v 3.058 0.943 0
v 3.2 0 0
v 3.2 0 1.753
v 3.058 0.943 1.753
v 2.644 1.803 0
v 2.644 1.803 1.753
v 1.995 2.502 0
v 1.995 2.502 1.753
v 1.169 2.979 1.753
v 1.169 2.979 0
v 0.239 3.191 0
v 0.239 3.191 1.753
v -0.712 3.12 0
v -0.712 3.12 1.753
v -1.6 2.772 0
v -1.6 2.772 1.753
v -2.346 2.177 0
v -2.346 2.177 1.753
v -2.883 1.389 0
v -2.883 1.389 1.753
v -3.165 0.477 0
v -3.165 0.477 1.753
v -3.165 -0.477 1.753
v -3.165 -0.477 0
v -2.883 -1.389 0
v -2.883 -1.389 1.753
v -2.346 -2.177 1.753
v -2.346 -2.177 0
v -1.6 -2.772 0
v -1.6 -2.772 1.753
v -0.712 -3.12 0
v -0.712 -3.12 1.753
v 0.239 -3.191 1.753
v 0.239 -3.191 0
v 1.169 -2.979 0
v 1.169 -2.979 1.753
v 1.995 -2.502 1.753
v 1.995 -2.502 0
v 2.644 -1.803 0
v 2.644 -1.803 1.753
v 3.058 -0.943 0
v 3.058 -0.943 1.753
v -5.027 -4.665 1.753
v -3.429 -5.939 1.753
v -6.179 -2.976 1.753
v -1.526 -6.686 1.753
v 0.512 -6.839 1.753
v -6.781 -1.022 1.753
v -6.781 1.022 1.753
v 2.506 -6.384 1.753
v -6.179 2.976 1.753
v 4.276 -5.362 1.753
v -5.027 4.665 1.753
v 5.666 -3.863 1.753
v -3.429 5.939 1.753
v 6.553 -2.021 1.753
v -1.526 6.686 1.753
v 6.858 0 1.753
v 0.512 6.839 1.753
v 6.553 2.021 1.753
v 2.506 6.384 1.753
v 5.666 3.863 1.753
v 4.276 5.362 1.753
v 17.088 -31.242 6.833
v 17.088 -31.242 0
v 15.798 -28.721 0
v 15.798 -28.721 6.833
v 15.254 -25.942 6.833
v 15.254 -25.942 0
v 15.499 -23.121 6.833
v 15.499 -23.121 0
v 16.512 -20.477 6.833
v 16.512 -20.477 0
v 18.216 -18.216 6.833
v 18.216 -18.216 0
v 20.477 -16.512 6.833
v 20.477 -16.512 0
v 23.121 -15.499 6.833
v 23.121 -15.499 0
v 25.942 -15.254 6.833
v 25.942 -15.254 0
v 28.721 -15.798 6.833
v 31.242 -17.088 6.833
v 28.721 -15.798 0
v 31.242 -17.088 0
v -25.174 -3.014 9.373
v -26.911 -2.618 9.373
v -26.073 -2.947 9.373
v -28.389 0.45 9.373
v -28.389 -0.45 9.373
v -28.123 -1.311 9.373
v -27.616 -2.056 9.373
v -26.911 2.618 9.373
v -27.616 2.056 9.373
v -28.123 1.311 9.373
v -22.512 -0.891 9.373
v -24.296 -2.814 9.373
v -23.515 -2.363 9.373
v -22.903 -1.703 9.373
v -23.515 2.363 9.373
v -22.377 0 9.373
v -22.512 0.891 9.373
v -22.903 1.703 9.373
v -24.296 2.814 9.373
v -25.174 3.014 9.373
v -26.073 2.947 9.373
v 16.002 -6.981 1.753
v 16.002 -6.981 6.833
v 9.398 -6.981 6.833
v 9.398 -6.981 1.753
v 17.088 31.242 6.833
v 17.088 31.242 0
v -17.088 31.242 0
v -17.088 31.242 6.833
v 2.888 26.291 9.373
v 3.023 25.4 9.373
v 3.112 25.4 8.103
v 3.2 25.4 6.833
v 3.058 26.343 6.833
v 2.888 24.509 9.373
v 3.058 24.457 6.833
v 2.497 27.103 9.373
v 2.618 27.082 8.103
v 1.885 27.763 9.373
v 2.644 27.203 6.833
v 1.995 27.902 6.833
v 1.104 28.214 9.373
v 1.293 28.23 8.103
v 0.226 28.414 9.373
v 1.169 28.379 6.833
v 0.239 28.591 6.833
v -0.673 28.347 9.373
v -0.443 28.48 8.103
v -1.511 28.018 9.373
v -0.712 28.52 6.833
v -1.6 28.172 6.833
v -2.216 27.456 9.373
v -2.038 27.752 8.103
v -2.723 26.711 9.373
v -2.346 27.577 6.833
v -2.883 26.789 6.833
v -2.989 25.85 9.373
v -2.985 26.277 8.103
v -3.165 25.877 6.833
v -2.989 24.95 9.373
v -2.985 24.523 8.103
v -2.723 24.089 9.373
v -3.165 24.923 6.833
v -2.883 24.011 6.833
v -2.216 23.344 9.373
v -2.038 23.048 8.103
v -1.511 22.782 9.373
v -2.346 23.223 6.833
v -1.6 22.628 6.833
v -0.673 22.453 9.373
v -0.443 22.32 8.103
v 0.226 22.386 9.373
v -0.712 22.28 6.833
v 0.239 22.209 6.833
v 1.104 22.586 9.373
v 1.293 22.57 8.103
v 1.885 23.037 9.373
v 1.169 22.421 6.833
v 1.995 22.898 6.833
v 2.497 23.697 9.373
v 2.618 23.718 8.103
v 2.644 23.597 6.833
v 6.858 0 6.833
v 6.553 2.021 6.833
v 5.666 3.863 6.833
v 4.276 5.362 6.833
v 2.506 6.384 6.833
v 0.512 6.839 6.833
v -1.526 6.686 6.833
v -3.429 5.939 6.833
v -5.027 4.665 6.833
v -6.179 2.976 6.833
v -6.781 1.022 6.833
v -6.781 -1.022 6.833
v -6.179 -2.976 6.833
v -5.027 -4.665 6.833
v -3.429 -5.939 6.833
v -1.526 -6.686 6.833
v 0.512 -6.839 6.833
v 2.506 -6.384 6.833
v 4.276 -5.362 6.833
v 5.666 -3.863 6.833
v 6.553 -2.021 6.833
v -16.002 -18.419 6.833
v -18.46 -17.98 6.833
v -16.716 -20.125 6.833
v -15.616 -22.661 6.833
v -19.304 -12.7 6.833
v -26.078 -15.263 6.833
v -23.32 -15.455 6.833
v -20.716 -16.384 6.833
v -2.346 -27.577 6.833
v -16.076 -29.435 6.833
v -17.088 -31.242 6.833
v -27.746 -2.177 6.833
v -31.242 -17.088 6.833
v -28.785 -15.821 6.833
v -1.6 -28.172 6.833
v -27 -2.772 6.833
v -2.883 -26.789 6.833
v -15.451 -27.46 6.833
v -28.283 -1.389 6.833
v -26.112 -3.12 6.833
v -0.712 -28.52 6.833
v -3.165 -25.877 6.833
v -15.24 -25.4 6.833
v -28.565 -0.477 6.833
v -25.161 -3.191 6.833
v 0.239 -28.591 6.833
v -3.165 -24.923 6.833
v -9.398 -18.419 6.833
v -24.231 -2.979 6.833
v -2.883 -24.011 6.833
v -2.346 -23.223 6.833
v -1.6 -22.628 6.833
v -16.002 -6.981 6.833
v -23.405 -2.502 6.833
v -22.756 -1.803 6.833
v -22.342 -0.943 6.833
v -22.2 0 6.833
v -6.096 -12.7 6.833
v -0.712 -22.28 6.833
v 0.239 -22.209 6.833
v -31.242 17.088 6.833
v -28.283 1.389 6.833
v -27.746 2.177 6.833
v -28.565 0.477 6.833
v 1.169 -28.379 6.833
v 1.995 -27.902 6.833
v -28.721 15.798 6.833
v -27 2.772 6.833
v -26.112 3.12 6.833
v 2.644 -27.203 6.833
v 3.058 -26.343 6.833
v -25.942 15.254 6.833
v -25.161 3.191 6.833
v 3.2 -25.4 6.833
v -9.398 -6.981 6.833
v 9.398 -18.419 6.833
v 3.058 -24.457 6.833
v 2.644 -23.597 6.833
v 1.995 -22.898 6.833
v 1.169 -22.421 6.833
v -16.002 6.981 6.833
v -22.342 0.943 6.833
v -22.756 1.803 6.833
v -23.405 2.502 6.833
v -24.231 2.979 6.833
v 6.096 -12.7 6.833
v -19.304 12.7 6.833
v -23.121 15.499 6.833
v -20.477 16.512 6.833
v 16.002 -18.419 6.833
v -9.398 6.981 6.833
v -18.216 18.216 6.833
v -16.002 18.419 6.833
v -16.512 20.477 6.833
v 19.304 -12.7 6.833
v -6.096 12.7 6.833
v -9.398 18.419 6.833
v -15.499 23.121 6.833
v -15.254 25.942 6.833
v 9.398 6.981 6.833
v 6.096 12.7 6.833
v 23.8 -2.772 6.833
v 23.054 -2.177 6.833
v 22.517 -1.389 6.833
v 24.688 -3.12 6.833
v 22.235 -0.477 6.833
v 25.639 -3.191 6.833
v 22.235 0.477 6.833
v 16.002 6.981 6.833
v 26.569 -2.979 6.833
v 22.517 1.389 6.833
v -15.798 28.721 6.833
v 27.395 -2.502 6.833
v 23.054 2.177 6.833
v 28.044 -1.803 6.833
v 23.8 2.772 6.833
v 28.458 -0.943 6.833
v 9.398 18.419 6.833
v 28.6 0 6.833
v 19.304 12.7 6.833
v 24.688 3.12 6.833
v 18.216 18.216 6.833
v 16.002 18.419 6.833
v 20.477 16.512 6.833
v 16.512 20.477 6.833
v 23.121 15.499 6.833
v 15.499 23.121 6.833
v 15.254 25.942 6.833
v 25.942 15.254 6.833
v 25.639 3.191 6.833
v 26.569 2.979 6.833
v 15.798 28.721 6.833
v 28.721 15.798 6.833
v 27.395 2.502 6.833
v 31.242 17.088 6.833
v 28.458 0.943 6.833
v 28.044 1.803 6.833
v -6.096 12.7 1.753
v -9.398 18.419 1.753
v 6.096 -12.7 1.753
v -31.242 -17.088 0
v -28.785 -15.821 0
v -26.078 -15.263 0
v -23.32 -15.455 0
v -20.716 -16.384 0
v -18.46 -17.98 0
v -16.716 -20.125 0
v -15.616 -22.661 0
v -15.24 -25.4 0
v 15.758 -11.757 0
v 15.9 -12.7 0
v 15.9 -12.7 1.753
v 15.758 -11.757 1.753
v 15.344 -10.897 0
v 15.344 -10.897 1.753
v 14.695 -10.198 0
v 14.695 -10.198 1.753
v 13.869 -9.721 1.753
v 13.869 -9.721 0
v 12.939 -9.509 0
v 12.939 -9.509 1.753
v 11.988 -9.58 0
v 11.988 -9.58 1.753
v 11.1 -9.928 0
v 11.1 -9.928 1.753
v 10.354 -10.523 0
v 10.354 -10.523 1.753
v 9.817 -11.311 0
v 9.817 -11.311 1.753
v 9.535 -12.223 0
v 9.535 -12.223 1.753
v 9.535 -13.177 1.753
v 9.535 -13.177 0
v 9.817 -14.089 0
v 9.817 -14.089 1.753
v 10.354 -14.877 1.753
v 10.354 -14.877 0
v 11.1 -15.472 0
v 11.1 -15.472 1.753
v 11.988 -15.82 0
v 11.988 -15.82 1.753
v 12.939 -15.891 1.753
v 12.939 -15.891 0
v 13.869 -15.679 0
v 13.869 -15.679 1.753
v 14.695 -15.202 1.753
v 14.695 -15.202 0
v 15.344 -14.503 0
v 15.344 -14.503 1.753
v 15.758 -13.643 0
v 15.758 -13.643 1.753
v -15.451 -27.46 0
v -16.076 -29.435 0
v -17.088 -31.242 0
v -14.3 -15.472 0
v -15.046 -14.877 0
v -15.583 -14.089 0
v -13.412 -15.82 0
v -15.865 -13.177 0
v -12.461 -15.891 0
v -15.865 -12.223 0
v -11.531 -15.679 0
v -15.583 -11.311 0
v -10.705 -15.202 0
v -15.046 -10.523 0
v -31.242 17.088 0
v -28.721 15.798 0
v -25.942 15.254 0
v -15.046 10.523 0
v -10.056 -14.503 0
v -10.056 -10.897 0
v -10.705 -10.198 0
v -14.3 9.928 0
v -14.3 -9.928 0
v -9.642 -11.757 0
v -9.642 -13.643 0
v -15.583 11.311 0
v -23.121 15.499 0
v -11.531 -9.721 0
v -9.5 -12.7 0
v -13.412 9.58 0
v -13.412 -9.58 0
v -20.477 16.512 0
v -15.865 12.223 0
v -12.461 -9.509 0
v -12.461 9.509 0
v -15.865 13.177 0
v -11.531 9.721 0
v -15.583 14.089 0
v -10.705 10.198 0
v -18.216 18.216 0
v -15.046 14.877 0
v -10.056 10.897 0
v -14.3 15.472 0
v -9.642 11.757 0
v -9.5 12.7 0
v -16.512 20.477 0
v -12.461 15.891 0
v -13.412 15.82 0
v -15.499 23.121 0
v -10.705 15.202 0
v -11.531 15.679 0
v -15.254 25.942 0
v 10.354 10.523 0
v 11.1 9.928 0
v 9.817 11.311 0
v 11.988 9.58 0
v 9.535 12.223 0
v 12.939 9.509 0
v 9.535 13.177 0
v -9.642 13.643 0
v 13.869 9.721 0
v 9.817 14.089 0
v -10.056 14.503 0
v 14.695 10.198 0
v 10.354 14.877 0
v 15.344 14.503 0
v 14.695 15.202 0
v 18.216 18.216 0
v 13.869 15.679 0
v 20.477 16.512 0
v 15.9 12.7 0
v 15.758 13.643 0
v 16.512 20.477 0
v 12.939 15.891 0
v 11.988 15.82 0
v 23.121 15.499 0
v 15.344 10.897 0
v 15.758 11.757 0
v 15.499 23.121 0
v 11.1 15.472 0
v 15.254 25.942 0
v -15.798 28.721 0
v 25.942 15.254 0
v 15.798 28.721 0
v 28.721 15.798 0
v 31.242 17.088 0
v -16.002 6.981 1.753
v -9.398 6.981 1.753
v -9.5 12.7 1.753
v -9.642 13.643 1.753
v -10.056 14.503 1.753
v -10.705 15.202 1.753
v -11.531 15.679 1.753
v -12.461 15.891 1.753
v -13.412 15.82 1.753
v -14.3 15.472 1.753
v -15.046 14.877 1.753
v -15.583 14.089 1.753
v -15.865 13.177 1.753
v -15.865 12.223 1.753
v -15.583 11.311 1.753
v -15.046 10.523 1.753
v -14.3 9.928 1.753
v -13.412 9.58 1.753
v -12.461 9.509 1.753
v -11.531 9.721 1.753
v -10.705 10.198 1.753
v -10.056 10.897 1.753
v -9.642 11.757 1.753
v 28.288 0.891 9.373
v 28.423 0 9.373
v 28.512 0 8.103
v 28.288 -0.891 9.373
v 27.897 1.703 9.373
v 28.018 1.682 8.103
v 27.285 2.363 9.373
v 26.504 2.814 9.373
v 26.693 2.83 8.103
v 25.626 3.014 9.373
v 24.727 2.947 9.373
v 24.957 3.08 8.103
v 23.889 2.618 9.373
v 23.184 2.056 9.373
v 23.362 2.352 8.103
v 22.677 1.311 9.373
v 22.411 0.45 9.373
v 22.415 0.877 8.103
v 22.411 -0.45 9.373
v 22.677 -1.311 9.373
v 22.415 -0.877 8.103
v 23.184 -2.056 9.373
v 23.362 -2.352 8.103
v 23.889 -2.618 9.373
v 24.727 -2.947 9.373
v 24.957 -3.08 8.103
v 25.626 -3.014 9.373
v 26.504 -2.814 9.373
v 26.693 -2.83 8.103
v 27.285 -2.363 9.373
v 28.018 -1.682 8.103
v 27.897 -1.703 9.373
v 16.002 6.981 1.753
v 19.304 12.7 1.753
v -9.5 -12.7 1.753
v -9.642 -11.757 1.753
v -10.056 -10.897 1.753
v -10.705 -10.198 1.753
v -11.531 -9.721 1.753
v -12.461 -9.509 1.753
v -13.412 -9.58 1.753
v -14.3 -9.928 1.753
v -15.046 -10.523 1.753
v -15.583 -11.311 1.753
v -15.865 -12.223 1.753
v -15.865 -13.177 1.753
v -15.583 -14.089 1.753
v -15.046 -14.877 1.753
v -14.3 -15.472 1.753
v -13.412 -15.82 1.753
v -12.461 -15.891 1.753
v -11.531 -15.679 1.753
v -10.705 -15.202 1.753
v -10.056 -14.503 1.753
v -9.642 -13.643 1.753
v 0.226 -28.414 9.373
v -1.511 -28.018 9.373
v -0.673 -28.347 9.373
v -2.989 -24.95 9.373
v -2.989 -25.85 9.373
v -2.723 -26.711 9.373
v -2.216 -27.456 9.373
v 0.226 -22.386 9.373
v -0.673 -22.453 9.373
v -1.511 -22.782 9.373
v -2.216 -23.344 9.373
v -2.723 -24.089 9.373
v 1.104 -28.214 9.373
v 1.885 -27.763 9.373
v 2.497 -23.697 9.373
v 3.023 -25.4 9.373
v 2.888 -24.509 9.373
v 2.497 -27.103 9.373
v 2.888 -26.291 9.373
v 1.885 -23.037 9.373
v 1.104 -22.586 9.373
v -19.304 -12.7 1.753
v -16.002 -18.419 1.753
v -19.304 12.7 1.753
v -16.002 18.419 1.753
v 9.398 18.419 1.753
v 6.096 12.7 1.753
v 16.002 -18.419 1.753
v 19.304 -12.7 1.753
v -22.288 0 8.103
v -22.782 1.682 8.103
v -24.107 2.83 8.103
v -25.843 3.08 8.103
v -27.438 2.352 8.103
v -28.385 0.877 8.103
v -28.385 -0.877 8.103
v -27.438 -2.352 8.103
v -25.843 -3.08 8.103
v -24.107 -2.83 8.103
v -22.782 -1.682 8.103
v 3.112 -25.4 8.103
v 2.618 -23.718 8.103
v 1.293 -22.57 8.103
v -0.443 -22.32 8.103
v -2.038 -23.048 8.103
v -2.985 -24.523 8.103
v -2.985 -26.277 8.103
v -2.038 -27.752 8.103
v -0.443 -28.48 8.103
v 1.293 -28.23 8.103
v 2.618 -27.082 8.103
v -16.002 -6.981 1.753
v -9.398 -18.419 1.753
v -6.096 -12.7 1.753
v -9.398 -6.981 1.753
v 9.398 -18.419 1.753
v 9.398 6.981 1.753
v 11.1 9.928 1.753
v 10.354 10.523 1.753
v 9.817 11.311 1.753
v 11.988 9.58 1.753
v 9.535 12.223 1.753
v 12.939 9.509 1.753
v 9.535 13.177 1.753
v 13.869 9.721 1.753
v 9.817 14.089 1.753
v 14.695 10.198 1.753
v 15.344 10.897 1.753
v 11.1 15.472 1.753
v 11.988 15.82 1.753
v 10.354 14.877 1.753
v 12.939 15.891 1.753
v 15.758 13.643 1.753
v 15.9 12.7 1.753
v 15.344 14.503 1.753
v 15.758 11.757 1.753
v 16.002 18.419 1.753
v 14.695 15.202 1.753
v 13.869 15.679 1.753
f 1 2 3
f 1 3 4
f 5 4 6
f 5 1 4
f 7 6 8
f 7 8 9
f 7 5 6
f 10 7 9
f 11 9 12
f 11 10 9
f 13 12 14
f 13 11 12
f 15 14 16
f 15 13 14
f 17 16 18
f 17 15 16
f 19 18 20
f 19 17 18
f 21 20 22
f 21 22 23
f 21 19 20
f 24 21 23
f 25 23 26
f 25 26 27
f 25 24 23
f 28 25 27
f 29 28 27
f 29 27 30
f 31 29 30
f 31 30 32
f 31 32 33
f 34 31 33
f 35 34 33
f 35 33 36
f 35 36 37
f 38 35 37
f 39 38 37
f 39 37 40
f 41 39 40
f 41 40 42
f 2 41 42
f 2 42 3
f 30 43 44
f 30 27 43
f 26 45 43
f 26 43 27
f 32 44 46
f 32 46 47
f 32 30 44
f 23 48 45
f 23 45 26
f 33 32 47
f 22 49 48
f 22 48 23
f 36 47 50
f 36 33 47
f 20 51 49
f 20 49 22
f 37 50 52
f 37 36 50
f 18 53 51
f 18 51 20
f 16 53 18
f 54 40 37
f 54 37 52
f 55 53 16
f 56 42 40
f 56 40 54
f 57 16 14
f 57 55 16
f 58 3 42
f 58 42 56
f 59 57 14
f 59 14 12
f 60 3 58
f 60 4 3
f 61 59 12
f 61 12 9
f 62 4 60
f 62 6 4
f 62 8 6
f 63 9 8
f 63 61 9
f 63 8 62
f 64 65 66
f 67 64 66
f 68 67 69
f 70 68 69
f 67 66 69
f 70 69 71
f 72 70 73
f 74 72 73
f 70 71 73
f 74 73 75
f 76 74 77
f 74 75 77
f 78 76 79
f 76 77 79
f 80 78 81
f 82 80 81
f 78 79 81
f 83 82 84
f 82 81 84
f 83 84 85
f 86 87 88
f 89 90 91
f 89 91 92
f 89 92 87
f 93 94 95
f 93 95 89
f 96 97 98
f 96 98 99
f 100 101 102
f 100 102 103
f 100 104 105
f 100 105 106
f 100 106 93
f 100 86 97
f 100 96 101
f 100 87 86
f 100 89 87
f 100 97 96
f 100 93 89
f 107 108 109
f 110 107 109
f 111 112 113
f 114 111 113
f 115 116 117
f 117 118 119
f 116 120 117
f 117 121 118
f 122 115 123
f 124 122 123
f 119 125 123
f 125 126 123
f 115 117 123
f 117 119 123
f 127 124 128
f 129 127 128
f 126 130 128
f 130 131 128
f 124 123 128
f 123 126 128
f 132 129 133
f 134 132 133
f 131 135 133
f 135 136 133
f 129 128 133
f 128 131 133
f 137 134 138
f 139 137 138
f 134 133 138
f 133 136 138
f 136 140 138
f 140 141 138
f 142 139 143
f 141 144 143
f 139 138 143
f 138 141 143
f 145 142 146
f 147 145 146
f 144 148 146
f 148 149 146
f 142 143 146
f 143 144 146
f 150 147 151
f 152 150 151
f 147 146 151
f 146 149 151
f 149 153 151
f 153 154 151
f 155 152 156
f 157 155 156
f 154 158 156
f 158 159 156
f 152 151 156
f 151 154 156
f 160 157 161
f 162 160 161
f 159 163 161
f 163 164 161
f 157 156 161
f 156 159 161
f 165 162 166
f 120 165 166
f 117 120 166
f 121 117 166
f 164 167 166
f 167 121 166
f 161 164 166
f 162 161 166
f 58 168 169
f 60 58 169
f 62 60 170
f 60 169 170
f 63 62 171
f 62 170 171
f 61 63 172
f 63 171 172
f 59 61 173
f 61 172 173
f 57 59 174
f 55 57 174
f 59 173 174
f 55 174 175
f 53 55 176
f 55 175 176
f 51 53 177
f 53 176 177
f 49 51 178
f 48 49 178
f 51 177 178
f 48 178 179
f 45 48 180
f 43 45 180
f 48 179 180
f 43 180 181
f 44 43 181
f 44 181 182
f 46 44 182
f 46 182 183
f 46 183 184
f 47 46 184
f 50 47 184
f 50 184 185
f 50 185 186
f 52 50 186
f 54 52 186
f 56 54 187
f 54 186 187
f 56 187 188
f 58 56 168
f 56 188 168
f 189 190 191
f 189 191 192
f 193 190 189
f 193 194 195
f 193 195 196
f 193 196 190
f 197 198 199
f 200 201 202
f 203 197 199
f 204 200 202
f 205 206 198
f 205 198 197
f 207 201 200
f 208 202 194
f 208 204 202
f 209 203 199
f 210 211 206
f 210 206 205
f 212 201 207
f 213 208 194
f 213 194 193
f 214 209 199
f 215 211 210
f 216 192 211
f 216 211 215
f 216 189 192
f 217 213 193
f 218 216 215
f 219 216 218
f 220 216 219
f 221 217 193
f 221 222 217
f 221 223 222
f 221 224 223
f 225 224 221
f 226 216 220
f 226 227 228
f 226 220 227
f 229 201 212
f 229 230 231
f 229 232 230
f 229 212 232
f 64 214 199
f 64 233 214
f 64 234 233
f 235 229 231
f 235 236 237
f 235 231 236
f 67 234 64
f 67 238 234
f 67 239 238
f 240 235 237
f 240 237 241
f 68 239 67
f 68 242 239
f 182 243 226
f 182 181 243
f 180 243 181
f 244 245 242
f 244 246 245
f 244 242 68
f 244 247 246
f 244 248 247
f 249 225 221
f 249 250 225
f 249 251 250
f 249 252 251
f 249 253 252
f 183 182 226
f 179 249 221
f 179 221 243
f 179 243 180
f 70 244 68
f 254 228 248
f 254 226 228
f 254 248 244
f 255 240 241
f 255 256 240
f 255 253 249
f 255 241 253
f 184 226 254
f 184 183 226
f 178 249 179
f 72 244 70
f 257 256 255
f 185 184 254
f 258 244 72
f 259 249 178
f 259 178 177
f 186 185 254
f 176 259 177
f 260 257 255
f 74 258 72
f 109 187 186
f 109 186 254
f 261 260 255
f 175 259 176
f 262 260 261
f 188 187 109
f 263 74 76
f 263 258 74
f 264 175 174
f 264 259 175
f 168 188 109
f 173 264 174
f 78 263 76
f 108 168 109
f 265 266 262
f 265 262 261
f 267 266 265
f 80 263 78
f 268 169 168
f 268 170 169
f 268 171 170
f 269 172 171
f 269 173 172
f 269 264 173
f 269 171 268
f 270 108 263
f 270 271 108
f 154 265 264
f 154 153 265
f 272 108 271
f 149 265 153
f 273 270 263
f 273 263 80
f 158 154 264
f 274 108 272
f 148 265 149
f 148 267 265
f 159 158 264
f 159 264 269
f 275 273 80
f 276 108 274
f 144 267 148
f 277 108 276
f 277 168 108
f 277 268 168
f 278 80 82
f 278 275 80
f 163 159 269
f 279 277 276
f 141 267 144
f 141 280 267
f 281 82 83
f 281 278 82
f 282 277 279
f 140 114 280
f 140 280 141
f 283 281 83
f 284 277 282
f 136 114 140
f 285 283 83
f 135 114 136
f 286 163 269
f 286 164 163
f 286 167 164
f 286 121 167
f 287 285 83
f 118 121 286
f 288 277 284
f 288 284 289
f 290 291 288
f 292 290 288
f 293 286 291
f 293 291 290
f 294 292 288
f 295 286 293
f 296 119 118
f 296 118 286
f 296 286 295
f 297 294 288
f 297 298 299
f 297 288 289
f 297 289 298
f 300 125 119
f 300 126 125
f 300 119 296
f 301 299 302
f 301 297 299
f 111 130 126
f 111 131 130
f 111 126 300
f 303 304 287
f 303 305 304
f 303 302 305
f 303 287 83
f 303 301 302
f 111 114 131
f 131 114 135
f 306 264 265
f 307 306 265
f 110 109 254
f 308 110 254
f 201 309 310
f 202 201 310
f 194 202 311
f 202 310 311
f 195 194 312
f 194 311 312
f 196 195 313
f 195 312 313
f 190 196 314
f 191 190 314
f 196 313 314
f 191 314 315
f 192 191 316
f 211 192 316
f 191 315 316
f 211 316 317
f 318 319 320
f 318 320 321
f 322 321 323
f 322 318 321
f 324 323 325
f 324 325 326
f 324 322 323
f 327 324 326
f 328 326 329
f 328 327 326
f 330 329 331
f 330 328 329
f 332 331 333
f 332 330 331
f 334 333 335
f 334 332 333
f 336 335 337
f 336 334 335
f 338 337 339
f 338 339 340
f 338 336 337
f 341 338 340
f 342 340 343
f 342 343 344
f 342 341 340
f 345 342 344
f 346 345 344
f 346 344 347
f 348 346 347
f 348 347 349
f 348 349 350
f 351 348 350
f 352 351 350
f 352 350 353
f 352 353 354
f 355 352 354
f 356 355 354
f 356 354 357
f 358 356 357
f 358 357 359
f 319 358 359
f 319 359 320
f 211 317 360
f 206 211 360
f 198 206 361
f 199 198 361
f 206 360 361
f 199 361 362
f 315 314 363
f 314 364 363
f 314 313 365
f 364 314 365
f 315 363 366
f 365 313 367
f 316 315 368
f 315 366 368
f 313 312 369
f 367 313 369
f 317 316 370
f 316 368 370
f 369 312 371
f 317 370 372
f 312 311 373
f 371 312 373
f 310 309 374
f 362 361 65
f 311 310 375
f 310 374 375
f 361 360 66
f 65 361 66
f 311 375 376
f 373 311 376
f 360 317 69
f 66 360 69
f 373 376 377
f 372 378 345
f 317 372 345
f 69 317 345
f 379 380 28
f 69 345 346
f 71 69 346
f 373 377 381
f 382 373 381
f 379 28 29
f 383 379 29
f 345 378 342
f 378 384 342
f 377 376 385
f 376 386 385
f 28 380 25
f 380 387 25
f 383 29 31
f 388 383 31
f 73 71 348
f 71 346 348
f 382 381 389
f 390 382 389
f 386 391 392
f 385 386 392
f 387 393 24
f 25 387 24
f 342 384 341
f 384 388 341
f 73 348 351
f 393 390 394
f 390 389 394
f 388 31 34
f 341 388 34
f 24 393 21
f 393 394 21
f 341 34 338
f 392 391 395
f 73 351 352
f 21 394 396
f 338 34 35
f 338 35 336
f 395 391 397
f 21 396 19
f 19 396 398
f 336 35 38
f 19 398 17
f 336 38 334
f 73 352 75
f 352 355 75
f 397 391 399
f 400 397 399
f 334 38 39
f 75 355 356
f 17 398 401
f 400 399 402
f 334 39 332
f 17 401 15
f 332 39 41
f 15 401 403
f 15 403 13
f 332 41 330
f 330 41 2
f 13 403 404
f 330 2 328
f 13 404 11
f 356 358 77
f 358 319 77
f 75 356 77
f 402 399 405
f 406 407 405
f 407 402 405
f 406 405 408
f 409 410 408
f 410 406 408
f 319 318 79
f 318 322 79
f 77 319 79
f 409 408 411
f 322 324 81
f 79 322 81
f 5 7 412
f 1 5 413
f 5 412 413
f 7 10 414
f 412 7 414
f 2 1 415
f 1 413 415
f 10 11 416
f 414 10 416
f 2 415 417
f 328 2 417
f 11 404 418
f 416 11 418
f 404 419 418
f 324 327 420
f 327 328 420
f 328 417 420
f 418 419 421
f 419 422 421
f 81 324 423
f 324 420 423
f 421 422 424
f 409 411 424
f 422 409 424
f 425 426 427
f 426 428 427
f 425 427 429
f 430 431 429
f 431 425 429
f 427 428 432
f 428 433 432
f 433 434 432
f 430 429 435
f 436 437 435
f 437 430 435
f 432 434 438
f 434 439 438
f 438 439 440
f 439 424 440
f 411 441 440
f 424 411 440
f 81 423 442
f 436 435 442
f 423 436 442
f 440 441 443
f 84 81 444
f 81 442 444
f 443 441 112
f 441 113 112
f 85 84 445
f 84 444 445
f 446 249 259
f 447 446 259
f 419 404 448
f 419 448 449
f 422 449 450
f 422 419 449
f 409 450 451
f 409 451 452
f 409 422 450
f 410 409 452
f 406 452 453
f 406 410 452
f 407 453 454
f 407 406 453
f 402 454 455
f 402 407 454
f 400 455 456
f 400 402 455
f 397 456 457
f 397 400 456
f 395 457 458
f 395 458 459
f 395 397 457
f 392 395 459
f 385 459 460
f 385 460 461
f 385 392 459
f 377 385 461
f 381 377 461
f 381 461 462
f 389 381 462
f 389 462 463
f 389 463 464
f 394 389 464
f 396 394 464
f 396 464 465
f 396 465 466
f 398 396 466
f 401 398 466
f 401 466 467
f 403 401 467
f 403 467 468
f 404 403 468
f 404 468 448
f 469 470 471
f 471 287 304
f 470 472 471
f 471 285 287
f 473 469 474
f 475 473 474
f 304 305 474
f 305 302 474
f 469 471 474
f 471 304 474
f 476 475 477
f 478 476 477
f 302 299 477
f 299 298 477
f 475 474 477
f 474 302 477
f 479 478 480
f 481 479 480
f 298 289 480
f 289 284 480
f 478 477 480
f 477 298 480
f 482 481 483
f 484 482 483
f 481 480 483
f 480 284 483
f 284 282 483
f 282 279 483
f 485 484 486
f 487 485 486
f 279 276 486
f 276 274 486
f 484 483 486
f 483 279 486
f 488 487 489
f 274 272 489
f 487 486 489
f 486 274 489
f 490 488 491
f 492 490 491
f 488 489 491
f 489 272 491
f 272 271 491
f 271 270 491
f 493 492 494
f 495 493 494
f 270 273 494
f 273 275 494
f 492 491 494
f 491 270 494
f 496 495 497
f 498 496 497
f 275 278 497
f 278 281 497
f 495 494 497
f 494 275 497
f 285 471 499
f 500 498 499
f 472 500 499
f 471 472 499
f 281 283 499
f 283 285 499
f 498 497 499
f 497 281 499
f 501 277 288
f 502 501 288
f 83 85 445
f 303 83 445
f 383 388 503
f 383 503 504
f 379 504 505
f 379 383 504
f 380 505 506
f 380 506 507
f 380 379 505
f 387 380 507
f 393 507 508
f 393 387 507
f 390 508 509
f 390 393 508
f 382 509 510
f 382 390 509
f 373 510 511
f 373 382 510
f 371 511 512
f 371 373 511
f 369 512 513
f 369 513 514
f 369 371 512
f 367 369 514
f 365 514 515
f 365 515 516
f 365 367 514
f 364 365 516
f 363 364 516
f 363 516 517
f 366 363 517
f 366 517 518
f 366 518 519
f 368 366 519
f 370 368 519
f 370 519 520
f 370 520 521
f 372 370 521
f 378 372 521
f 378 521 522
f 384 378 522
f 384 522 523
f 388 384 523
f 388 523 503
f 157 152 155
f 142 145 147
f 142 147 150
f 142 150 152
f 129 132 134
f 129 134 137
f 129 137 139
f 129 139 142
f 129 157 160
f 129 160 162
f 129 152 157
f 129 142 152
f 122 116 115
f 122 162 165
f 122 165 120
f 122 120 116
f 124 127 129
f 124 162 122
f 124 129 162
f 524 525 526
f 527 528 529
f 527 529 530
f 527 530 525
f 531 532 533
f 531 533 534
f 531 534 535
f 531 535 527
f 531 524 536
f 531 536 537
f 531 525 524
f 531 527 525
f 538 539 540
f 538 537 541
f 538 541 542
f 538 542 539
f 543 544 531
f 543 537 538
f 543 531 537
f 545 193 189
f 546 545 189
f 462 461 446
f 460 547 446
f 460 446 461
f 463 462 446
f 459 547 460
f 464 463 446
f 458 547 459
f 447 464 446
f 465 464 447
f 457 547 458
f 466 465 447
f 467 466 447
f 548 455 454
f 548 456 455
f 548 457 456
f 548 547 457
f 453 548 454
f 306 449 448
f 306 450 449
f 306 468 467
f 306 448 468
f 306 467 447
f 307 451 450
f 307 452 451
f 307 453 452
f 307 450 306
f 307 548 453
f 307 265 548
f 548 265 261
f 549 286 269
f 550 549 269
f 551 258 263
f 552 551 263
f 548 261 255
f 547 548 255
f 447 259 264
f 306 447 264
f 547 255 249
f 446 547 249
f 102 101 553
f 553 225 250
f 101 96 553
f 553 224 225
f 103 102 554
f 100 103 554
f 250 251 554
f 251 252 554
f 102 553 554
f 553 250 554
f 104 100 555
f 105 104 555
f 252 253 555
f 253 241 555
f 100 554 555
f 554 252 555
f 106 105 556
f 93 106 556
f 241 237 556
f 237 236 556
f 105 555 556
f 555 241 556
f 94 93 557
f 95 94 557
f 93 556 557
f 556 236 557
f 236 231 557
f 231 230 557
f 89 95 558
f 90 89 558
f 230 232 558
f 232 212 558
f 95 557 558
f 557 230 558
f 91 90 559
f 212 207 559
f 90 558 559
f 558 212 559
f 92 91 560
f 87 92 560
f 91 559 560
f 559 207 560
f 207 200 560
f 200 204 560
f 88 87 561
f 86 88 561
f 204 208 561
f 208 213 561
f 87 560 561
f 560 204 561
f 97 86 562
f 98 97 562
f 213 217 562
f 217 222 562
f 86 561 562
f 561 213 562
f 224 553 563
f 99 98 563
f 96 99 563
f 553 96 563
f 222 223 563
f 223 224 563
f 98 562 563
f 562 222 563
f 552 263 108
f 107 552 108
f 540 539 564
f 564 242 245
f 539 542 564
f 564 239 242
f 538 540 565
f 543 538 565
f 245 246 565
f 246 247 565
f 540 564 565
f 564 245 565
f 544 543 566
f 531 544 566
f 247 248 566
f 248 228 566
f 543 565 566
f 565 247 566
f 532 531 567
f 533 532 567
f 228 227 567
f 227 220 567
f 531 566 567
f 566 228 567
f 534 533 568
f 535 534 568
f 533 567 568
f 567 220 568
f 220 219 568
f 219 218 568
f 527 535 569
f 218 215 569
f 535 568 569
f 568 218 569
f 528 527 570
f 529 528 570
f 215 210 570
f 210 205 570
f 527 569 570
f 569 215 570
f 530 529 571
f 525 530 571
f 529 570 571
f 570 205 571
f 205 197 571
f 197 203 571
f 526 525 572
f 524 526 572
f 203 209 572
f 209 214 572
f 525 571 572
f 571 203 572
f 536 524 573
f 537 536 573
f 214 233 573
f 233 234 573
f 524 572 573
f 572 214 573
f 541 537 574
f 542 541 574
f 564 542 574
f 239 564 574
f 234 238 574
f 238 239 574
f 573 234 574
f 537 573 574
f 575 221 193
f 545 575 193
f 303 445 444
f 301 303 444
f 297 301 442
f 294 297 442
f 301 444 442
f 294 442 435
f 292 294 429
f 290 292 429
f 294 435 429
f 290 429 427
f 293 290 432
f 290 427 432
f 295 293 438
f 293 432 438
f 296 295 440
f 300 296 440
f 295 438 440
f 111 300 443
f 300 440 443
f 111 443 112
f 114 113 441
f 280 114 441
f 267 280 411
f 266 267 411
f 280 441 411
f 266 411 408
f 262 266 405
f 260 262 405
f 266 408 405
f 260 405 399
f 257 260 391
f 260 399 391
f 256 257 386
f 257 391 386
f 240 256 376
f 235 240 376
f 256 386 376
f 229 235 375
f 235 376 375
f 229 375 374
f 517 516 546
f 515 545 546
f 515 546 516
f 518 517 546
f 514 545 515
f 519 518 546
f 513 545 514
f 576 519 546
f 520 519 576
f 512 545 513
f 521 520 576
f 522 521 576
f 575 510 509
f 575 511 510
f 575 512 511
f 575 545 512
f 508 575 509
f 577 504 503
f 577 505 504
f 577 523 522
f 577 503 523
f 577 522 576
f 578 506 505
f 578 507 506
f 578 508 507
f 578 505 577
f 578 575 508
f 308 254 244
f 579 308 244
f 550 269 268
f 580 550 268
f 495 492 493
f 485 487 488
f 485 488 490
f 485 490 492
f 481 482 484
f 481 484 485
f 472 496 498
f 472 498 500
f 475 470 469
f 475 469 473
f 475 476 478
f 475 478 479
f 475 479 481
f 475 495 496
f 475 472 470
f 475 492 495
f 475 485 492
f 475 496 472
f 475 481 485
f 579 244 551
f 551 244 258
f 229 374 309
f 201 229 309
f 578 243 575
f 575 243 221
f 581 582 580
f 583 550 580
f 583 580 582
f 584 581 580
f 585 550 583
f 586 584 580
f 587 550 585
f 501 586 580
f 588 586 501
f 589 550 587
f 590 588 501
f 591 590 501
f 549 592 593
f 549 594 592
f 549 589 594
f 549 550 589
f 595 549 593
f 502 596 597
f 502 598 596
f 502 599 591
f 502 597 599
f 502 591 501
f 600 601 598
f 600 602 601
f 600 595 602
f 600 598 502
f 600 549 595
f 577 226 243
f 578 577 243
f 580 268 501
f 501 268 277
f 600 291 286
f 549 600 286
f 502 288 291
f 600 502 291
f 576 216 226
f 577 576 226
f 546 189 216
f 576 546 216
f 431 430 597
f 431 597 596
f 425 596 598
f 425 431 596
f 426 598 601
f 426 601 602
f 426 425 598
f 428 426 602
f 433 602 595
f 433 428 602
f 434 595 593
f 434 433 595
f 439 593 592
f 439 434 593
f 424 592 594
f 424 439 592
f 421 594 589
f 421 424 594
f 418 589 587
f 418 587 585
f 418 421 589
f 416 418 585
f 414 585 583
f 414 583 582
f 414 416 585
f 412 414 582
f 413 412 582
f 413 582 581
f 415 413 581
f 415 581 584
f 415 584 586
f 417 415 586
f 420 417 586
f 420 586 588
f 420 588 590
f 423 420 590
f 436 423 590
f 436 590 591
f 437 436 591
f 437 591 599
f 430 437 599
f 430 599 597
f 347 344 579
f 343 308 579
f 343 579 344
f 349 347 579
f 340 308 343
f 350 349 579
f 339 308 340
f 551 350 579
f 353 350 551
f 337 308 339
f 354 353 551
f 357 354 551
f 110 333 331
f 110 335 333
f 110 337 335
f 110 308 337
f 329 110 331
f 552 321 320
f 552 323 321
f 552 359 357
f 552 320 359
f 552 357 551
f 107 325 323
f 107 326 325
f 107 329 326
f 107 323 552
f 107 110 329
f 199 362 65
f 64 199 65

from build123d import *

# Parameters (mm, degrees)
F0_R       = 3.2004
F0_R_2     = 6.858
F1_DEPTH   = 6.8326
F2_DEPTH   = 9.3726
F3_R       = 3.2004
F3_R_2     = 6.858
F4_DEPTH   = 5.08
F5_SIZE2   = 2.53999
F5_SIZE    = 0.17779
F5_2_SIZE2 = 2.53999
F5_2_SIZE  = 0.17779
F5_3_SIZE2 = 2.53999
F5_3_SIZE  = 0.17779
F5_4_SIZE2 = 2.53999
F5_4_SIZE  = 0.17779


# Not quite as in the source:
# - a fillet or chamfer is up to 0.001 mm smaller than in the source, because OpenCascade refuses the exact size


with BuildPart() as f1:
    # F0 (on Top) → F1 (new body)
    with BuildSketch(Plane.XY):
        with BuildLine():
            ThreePointArc((-31.242, -17.0875613686), (-20.7164714157, -16.3838944106), (-15.24, -25.4))
            ThreePointArc((-15.24, -25.4), (-15.712895776, -28.4635945803), (-17.0875613686, -31.242))
            Line((-17.0875613686, -31.242), (17.0875613686, -31.242))
            ThreePointArc((17.0875613686, -31.242), (18.2157951031, -18.2157951031), (31.242, -17.0875613686))
            Line((31.242, -17.0875613686), (31.242, 17.0875613686))
            ThreePointArc((31.242, 17.0875613686), (18.2157951031, 18.2157951031), (17.0875613686, 31.242))
            Line((17.0875613686, 31.242), (-17.0875613686, 31.242))
            ThreePointArc((-17.0875613686, 31.242), (-18.2157951031, 18.2157951031), (-31.242, 17.0875613686))
            Line((-31.242, 17.0875613686), (-31.242, -17.0875613686))
        make_face()
        with Locations((0, -25.4)):
            Circle(F0_R, mode=Mode.SUBTRACT)
        with Locations((-25.4, 0)):
            Circle(F0_R, mode=Mode.SUBTRACT)
        with Locations((-12.7, -12.7)):
            Circle(F0_R, mode=Mode.SUBTRACT)
        Circle(F0_R_2, mode=Mode.SUBTRACT)
        with Locations((12.7, -12.7)):
            Circle(F0_R, mode=Mode.SUBTRACT)
        with Locations((25.4, 0)):
            Circle(F0_R, mode=Mode.SUBTRACT)
        with Locations((-12.7, 12.7)):
            Circle(F0_R, mode=Mode.SUBTRACT)
        with Locations((0, 25.4)):
            Circle(F0_R, mode=Mode.SUBTRACT)
        with Locations((12.7, 12.7)):
            Circle(F0_R, mode=Mode.SUBTRACT)
        Circle(F0_R_2)
        Circle(F0_R, mode=Mode.SUBTRACT)
    extrude(amount=F1_DEPTH)

    # F0 (on Top) → F2 (join)
    with BuildSketch(Plane.XY):
        with Locations((-25.4, 0)):
            Circle(F0_R)
        with Locations((0, -25.4)):
            Circle(F0_R)
        with Locations((25.4, 0)):
            Circle(F0_R)
        with Locations((0, 25.4)):
            Circle(F0_R)
    extrude(amount=F2_DEPTH)

    # F3 (on face) → F4 (cut)
    with BuildSketch(Plane.XY.offset(6.8326)):
        Polygon((-9.398, 6.9807682334), (-6.096, 12.7), (-9.398, 18.4192317666), (-16.002, 18.4192317666), (-19.304, 12.7), (-16.002, 6.9807682334), align=None)
        with Locations((-12.7, 12.7)):
            Circle(F3_R, mode=Mode.SUBTRACT)
        Polygon((9.398, 18.4192317666), (6.096, 12.7), (9.398, 6.9807682334), (16.002, 6.9807682334), (19.304, 12.7), (16.002, 18.4192317666), align=None)
        with Locations((12.7, 12.7)):
            Circle(F3_R, mode=Mode.SUBTRACT)
        Polygon((-9.398, -18.4192317666), (-6.096, -12.7), (-9.398, -6.9807682334), (-16.002, -6.9807682334), (-19.304, -12.7), (-16.002, -18.4192317666), align=None)
        with Locations((-12.7, -12.7)):
            Circle(F3_R, mode=Mode.SUBTRACT)
        Polygon((9.398, -6.9807682334), (6.096, -12.7), (9.398, -18.4192317666), (16.002, -18.4192317666), (19.304, -12.7), (16.002, -6.9807682334), align=None)
        with Locations((12.7, -12.7)):
            Circle(F3_R, mode=Mode.SUBTRACT)
        Circle(F3_R_2)
        Circle(F3_R, mode=Mode.SUBTRACT)
    extrude(amount=-F4_DEPTH, mode=Mode.SUBTRACT)

    # F5 (size 0.1778 and 2.54 in the source; OpenCascade refuses exactly that, so slightly less here)
    f5_edges = [f1.edges().sort_by_distance(p)[0] for p in [
        (-28.6004, 0, 9.3726),
    ]]
    f5_side = f1.faces().sort_by_distance((-25.4, 0, 9.3726))[0]
    chamfer(f5_edges, length=F5_SIZE, length2=F5_SIZE2, reference=f5_side)

    # F5#2 (size 0.1778 and 2.54 in the source; OpenCascade refuses exactly that, so slightly less here)
    f5_2_edges = [f1.edges().sort_by_distance(p)[0] for p in [
        (-3.2004, 25.4, 9.3726),
    ]]
    f5_2_side = f1.faces().sort_by_distance((0, 25.4, 9.3726))[0]
    chamfer(f5_2_edges, length=F5_2_SIZE, length2=F5_2_SIZE2, reference=f5_2_side)

    # F5#3 (size 0.1778 and 2.54 in the source; OpenCascade refuses exactly that, so slightly less here)
    f5_3_edges = [f1.edges().sort_by_distance(p)[0] for p in [
        (22.1996, 0, 9.3726),
    ]]
    f5_3_side = f1.faces().sort_by_distance((25.4, 0, 9.3726))[0]
    chamfer(f5_3_edges, length=F5_3_SIZE, length2=F5_3_SIZE2, reference=f5_3_side)

    # F5#4 (size 0.1778 and 2.54 in the source; OpenCascade refuses exactly that, so slightly less here)
    f5_4_edges = [f1.edges().sort_by_distance(p)[0] for p in [
        (-3.2004, -25.4, 9.3726),
    ]]
    f5_4_side = f1.faces().sort_by_distance((0, -25.4, 9.3726))[0]
    chamfer(f5_4_edges, length=F5_4_SIZE, length2=F5_4_SIZE2, reference=f5_4_side)


solid = f1.part
